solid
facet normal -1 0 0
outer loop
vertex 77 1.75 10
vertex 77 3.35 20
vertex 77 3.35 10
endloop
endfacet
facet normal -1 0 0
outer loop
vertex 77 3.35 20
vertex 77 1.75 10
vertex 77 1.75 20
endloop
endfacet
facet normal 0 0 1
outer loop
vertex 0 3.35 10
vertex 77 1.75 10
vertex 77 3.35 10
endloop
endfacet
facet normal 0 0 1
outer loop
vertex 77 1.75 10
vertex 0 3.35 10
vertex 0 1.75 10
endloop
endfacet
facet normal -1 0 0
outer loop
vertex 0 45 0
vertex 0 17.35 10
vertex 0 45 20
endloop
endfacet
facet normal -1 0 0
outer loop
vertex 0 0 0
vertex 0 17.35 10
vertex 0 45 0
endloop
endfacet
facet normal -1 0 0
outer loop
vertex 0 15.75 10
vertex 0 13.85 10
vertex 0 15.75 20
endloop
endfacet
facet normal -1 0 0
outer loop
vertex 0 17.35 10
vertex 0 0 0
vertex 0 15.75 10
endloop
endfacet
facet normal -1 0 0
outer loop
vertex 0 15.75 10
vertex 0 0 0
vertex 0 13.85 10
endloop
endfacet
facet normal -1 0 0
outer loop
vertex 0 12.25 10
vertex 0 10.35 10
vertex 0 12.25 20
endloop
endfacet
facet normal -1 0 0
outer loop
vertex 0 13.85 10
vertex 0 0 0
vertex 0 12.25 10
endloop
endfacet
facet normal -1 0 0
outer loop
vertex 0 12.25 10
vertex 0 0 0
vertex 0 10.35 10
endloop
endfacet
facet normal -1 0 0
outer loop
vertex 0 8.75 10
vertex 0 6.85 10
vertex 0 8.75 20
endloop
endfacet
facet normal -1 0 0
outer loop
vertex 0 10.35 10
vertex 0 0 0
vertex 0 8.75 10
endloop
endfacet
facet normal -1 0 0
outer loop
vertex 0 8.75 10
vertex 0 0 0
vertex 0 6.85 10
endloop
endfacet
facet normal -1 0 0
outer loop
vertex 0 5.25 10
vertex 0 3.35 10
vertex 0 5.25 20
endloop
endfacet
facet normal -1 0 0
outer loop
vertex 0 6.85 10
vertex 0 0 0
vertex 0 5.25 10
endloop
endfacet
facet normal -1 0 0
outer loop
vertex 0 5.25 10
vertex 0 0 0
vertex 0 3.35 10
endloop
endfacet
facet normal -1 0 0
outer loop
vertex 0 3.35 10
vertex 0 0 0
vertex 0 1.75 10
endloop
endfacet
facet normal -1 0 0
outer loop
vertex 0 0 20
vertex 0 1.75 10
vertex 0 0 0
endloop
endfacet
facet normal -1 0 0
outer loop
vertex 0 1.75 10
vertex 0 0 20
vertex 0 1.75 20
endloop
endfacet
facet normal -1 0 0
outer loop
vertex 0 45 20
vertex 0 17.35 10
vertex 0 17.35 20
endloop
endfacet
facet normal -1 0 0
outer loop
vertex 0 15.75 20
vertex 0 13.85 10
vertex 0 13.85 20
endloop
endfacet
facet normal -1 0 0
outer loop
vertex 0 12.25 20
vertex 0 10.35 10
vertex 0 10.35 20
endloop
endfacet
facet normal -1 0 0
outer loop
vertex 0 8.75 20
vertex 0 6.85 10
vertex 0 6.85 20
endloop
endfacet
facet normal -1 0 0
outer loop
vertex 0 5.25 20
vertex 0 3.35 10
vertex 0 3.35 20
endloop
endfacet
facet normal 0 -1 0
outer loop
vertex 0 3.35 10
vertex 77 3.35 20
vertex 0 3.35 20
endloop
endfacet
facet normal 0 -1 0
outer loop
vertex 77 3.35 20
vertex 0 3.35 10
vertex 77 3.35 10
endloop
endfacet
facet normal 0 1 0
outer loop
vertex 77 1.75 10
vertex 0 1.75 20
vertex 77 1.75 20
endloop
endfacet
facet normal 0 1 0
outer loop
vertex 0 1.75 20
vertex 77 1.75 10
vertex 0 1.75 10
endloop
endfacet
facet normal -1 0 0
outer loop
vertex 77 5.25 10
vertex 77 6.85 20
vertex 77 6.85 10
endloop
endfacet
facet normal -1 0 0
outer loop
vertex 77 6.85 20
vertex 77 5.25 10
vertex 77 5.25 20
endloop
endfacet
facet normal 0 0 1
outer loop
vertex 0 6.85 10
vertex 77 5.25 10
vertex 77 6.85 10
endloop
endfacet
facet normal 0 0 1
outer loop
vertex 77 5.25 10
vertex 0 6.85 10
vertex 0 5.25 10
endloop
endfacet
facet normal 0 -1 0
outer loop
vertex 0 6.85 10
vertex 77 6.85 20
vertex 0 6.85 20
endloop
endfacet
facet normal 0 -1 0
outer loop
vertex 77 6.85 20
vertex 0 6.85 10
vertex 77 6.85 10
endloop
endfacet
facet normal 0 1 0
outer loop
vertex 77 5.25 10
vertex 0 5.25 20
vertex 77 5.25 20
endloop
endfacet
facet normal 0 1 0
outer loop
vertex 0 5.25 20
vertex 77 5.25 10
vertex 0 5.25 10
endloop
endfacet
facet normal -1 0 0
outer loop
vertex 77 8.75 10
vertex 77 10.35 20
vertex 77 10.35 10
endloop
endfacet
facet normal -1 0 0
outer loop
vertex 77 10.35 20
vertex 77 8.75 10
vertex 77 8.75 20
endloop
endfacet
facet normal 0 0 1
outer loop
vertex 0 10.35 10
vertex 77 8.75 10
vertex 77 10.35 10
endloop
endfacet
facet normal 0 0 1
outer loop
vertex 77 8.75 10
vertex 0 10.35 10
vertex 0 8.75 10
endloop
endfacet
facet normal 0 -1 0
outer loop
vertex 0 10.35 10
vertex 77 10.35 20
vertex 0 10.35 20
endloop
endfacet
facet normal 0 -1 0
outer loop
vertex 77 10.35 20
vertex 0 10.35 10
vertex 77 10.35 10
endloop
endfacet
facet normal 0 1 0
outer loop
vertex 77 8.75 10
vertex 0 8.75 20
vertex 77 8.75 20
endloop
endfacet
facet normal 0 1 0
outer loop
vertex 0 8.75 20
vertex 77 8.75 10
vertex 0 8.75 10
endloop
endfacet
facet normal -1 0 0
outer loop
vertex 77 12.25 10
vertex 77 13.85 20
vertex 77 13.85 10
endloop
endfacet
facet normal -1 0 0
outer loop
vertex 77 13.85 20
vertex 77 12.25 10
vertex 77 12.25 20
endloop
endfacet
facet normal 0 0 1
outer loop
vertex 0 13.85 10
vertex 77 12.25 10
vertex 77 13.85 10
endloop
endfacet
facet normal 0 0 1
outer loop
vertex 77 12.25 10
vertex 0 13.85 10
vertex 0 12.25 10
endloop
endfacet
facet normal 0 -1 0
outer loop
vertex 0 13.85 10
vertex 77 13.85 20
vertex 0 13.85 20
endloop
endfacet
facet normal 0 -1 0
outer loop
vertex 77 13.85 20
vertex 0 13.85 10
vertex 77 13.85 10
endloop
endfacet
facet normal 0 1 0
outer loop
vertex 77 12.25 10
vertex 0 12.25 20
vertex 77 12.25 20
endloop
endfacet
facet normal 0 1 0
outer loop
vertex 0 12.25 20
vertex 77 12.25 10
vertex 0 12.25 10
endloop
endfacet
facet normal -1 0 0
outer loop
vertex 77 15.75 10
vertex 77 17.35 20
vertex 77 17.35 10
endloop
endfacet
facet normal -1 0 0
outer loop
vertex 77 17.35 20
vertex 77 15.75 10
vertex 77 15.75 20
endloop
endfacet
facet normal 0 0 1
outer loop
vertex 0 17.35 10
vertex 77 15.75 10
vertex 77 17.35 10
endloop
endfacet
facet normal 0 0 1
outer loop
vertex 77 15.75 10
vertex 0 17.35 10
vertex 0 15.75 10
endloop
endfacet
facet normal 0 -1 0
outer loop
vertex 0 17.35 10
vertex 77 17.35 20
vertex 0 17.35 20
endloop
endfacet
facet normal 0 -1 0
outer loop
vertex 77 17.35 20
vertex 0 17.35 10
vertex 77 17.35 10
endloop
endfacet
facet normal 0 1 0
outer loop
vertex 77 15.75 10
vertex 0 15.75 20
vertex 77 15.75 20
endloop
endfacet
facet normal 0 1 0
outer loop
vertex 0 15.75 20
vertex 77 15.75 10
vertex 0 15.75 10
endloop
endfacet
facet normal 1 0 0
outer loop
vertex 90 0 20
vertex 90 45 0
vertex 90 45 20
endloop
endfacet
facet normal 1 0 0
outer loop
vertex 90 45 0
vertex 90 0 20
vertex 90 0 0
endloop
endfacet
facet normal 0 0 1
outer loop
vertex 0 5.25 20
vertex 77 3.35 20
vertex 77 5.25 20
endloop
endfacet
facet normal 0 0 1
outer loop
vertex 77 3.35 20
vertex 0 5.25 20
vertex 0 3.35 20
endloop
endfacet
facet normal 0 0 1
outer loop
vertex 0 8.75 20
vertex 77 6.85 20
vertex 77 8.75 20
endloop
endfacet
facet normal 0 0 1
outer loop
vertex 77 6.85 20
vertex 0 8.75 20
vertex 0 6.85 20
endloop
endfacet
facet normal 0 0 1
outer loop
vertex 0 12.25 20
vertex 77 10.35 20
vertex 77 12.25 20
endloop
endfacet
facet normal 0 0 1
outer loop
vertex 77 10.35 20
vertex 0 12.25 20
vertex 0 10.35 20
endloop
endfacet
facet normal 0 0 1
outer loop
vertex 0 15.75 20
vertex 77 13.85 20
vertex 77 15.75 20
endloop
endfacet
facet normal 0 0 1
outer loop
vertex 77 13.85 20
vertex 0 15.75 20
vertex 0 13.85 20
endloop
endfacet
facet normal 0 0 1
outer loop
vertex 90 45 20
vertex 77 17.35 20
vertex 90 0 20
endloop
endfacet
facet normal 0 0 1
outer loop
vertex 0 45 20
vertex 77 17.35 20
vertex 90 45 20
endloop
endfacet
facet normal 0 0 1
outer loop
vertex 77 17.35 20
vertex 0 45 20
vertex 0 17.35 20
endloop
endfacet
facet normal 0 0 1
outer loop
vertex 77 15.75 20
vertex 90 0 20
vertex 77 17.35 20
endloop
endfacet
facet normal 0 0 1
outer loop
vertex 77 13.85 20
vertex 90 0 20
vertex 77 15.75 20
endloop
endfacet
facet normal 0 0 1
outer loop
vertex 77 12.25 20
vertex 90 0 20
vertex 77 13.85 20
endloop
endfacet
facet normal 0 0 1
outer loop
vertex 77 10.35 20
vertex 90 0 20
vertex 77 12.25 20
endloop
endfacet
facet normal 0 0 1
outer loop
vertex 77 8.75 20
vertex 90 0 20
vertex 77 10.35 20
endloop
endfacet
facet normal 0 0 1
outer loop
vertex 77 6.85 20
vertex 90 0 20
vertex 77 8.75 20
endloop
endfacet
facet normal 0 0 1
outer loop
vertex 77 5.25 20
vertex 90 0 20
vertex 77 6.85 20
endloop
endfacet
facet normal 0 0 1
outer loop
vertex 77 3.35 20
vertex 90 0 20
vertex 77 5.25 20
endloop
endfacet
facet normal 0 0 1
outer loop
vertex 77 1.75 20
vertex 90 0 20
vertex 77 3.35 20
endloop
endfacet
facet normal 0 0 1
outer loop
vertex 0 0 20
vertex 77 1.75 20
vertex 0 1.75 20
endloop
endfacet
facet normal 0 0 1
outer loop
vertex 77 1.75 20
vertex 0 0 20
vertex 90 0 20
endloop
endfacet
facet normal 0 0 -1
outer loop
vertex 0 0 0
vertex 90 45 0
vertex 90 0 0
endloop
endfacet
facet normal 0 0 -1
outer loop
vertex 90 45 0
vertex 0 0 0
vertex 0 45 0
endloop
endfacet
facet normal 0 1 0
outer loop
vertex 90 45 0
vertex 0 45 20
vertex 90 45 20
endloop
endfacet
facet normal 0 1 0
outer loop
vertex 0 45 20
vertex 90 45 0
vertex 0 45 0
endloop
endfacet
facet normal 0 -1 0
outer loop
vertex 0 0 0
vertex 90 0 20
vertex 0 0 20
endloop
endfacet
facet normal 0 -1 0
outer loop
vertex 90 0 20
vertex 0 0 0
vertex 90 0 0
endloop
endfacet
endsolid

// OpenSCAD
$fn = 64; // Good practice, though mostly rectangular

    // Dimensions
    block_x = 90;
    block_y = 45;
    block_z = 20;
    slot_count = 10;
    slot_len = 77;
    slot_w = 1.6;
    slot_depth = 10;
    slot_spacing = 3.5;

    // Calculations
    block_x_half = block_x / 2;
    block_y_half = block_y / 2;
    block_z_half = block_z / 2;

    // Slot Group Centering
    // Total span from center of first slot to center of last slot
    total_center_span = (slot_count - 1) * slot_spacing;
    first_slot_center_y = -total_center_span / 2;

    // Main Block
    difference() {
        translate([0, 0, 0])
            cube([block_x, block_y, block_z]);

        // Slots
        for (i = [0 : slot_count - 1]) {
            y_pos = first_slot_center_y + i * slot_spacing;
            // Cutters extend 0.1mm past top face (Z=20)
            translate([0, y_pos, block_z - slot_depth])
                cube([slot_len, slot_w, slot_depth + 0.1]);
        }
    }
